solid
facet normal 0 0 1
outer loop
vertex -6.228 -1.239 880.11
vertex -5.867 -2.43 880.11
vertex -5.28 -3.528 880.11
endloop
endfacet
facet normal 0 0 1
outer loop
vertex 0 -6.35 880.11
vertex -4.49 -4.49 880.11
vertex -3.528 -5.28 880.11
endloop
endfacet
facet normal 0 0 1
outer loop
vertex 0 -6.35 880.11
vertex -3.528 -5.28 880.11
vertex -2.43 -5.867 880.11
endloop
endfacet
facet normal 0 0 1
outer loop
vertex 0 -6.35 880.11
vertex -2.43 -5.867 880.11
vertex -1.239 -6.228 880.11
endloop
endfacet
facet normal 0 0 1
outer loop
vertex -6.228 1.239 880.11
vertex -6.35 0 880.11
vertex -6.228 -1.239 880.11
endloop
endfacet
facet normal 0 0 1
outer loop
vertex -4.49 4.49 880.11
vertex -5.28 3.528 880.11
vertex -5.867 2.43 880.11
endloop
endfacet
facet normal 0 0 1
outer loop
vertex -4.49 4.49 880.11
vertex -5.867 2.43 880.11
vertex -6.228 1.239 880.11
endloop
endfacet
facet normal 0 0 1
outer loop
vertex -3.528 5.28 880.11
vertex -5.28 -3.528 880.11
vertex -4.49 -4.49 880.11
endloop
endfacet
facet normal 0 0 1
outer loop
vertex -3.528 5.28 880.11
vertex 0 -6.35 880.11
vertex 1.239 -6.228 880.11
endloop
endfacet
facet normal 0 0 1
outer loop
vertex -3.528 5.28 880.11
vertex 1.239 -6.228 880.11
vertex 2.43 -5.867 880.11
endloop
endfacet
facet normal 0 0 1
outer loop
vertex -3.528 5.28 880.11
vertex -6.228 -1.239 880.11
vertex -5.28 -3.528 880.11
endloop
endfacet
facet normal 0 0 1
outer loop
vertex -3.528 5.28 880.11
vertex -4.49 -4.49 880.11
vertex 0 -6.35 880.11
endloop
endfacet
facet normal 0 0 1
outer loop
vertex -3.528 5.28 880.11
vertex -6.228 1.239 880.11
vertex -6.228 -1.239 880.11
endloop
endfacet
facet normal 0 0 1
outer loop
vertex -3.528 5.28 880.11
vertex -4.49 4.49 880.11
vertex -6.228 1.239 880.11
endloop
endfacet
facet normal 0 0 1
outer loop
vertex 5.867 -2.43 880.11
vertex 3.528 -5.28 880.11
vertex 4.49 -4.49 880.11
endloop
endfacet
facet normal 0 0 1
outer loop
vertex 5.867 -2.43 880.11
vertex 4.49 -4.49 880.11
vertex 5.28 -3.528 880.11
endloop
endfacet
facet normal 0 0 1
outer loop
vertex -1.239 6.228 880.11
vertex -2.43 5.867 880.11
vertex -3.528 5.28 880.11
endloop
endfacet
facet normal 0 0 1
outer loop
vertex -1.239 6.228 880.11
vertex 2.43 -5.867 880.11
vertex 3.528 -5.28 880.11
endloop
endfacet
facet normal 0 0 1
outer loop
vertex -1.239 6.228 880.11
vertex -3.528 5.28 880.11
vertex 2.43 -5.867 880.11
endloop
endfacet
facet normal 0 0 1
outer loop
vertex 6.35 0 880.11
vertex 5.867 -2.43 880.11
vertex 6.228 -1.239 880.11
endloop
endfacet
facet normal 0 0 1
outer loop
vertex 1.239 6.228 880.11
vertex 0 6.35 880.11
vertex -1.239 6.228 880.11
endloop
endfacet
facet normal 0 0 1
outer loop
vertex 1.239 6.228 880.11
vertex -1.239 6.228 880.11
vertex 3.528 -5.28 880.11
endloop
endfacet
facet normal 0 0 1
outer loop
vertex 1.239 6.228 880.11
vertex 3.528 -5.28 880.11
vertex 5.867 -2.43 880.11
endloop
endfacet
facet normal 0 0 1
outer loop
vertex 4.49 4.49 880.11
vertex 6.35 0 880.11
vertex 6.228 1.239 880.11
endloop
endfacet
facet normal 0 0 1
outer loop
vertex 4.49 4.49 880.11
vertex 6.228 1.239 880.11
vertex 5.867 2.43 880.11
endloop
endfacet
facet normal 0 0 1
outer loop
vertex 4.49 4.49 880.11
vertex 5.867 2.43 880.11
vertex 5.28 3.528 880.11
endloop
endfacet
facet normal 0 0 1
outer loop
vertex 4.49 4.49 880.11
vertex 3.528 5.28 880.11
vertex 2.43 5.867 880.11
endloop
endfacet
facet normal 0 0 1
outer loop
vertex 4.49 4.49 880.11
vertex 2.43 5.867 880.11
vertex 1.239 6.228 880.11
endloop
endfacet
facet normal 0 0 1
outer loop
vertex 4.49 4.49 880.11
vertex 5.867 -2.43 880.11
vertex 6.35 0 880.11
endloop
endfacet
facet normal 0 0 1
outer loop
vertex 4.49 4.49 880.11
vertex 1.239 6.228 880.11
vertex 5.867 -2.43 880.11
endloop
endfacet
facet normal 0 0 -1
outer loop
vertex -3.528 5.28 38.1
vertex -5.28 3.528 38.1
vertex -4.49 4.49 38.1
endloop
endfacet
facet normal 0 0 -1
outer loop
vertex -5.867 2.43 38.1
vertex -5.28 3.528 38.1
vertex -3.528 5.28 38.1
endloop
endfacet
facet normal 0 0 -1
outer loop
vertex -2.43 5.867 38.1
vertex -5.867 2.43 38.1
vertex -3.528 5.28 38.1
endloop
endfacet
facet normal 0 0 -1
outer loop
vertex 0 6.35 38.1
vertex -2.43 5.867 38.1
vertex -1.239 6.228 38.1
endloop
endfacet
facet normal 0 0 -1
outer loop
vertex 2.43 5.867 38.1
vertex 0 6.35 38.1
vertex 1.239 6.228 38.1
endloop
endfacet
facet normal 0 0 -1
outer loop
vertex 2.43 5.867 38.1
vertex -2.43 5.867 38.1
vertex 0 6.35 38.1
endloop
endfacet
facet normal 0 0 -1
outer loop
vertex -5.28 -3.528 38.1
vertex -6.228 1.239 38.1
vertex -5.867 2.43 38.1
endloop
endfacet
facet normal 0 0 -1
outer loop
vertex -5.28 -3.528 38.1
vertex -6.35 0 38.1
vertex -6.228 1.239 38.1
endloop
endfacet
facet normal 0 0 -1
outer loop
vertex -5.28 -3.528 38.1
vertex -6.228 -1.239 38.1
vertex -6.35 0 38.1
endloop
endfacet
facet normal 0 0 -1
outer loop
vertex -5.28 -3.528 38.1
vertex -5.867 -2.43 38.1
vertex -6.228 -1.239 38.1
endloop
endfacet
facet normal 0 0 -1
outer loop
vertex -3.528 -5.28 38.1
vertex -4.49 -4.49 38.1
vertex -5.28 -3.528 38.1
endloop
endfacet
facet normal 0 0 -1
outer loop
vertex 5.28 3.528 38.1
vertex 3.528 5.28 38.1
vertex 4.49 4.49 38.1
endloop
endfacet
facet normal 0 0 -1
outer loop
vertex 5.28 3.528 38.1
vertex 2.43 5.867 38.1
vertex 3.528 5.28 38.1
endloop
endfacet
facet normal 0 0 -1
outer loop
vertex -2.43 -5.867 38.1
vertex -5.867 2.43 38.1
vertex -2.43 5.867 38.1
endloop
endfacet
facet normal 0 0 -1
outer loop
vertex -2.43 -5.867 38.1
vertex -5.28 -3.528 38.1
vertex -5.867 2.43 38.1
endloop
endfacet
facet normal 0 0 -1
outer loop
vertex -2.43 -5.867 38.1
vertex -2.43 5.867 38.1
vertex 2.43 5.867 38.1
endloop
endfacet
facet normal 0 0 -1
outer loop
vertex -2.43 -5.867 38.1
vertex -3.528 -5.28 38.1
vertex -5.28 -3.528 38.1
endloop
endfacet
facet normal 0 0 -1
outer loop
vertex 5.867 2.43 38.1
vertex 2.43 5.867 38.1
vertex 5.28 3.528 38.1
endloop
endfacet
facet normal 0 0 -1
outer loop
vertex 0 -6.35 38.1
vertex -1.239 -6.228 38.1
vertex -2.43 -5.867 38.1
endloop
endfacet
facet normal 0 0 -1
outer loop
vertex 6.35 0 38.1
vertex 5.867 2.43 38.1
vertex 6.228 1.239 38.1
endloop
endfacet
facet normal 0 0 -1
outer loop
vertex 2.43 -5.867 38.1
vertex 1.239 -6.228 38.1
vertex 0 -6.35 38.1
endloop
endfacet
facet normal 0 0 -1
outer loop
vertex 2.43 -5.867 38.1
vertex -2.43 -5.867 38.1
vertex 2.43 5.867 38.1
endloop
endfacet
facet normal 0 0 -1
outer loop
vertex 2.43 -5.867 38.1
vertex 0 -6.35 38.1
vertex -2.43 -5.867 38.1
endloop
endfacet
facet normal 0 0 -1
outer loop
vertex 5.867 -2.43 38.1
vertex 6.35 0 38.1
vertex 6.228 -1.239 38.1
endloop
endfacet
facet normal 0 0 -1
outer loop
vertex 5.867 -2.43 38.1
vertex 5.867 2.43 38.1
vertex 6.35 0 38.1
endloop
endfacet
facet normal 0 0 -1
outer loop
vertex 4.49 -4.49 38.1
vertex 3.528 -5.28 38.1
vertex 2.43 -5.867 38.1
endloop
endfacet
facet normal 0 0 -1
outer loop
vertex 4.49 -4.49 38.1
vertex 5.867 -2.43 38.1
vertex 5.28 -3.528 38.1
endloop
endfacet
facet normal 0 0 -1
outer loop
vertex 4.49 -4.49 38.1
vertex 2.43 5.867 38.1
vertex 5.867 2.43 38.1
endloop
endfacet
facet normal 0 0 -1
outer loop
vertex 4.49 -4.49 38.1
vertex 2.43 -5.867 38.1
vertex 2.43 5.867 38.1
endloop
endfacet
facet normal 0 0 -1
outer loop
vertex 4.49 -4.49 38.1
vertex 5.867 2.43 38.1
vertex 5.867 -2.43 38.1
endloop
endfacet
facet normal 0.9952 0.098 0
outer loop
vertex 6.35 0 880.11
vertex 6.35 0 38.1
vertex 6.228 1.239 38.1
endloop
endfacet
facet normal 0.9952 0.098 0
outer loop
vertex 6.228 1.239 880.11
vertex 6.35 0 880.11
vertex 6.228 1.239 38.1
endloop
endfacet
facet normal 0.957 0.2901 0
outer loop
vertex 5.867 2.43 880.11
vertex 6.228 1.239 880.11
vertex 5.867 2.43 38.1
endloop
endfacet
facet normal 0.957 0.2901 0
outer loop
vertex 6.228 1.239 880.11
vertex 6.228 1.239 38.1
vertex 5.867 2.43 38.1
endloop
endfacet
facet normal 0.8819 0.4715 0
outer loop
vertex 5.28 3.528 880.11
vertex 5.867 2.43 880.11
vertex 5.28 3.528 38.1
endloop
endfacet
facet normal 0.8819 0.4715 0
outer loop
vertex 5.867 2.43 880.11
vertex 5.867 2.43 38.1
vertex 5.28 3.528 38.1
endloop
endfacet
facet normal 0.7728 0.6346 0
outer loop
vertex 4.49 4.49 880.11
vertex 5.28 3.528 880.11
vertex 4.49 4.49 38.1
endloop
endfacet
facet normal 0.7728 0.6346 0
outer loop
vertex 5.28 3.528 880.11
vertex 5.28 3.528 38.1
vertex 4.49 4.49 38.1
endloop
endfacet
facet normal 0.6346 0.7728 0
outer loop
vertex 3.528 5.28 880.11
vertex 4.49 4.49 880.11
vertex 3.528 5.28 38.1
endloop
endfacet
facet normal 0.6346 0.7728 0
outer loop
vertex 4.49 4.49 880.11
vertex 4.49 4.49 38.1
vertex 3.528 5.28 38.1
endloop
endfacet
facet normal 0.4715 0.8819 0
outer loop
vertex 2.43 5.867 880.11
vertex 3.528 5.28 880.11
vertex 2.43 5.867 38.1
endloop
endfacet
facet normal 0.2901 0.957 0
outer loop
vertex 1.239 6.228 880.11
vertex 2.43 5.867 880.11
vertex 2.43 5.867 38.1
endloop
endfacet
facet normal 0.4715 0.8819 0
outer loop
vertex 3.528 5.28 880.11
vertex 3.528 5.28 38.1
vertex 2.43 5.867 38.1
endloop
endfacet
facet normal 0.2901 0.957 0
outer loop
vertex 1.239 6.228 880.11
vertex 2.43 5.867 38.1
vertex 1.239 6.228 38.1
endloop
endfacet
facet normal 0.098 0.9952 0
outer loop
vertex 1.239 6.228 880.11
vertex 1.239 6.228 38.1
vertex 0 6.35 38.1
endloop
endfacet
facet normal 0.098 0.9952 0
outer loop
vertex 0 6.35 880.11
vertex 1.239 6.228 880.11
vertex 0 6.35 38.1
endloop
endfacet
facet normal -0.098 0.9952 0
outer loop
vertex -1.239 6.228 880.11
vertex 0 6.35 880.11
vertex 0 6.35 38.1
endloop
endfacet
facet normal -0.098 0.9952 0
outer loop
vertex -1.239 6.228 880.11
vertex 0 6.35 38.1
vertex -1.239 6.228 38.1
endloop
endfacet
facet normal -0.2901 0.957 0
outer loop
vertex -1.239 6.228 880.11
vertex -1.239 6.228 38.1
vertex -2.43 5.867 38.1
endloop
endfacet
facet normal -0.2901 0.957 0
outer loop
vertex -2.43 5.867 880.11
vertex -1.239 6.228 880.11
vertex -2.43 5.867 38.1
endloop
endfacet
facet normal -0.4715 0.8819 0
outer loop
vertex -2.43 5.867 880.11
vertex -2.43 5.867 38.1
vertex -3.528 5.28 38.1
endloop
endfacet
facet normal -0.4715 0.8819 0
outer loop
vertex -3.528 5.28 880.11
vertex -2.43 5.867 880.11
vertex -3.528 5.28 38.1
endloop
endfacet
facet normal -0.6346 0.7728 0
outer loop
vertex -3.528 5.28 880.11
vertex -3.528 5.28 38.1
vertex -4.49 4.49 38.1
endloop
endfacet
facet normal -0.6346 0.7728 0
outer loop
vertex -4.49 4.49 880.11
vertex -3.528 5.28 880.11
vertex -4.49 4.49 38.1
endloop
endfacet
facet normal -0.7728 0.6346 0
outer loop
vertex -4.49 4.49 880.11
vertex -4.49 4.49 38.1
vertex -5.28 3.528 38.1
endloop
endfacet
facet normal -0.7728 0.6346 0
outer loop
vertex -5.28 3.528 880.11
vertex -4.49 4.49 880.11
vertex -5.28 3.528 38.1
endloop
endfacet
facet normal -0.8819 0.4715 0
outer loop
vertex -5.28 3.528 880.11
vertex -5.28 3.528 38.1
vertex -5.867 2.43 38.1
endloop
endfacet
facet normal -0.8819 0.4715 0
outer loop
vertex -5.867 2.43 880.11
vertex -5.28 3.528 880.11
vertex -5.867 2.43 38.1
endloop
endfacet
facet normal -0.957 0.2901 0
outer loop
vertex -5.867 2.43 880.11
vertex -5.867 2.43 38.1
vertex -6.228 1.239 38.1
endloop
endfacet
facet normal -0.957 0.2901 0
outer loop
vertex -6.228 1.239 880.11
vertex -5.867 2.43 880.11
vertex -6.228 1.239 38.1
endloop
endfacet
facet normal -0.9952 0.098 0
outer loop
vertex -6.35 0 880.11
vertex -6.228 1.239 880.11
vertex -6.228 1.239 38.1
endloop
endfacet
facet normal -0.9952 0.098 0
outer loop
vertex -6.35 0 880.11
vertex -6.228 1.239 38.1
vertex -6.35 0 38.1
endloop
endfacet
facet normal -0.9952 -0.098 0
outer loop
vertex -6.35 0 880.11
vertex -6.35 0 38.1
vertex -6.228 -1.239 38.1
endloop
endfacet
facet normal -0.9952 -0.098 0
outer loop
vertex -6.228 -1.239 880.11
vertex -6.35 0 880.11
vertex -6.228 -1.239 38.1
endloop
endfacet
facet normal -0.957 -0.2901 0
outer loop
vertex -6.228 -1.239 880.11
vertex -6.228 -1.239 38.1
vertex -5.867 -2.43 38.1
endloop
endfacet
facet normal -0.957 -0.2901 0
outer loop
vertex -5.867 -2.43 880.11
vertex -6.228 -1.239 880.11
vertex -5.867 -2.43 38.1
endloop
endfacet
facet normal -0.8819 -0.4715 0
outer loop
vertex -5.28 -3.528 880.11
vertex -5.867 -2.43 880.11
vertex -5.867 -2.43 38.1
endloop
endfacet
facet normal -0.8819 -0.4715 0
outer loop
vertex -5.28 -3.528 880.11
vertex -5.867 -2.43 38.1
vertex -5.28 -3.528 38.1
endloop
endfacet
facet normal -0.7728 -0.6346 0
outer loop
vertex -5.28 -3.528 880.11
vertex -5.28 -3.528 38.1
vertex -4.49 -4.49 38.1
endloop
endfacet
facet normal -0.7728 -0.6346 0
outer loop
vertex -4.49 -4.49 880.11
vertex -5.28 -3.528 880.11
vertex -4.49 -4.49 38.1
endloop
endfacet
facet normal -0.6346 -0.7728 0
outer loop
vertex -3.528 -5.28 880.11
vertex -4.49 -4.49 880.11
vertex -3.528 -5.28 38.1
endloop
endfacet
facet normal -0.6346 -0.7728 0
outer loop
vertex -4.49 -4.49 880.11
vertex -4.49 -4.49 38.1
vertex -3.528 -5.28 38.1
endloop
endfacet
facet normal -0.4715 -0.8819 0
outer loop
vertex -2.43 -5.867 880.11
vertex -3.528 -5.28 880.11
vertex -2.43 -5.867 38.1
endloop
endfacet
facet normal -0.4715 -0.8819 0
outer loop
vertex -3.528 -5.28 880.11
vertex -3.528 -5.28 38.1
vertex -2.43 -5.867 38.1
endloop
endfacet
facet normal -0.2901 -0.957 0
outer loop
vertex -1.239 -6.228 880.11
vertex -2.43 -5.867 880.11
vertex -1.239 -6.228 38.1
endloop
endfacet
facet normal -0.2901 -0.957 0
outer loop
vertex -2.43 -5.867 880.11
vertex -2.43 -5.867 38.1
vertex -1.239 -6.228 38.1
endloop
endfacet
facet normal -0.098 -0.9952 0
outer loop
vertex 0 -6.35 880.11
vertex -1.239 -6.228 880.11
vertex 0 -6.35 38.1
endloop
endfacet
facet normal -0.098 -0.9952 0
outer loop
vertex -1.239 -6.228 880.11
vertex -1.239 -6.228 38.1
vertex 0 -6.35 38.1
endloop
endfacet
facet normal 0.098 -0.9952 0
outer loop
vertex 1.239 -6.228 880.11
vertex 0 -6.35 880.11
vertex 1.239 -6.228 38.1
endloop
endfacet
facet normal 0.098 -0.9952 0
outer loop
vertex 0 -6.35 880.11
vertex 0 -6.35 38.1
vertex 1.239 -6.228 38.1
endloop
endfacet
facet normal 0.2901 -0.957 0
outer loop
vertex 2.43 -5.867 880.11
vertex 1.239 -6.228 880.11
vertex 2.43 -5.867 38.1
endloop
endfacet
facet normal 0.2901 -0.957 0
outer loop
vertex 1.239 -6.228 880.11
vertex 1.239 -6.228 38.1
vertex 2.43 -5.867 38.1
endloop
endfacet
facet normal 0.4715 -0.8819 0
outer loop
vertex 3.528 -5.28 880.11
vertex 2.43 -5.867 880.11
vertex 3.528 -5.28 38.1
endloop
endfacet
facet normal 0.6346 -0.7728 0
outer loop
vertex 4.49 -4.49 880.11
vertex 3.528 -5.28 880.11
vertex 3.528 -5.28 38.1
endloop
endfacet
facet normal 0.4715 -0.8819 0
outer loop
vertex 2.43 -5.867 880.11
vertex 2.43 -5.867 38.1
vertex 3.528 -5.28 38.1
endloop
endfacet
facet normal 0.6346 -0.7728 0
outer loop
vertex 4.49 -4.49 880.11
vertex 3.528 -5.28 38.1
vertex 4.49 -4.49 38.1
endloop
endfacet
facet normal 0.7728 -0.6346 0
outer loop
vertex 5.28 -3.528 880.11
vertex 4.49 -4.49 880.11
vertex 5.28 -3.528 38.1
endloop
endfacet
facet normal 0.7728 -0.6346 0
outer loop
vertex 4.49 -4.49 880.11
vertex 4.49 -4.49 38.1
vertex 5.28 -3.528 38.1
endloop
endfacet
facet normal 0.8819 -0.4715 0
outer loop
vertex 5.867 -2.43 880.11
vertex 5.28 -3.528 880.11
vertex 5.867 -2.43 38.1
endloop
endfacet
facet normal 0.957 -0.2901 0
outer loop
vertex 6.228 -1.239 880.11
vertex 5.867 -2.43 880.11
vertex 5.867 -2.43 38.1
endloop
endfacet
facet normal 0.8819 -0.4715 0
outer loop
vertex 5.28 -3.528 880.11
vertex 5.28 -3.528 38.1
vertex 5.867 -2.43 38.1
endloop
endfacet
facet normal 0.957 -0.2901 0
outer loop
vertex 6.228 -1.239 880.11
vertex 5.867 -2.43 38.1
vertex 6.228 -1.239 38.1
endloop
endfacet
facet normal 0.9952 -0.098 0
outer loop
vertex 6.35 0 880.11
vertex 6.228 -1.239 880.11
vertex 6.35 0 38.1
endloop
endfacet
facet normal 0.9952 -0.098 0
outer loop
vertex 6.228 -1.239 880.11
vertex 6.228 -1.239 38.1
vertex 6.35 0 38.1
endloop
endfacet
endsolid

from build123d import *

# Parameters (mm, degrees)
SKETCH1_R                    = 6.35
BOSS_EXTRUDE1_DEPTH          = 914.4
ENL_V_START                  = -34.29
ESQUISSE1_R                  = 6.35
ENL_V_MAT_EXTRU_1_DEPTH      = 34.29
ENL_V_MAT_EXTRU_3_DEPTH      = 881.155814103
ENL_V_MAT_EXTRU_3_DEPTH_BACK = 881.155814103
ESQUISSE3_W                  = 12.7
ESQUISSE3_H                  = 38.1


with BuildPart() as part:
    # Sketch1 → Boss-Extrude1 (new body)
    with BuildSketch(Plane.XY):
        Circle(SKETCH1_R)
    extrude(amount=BOSS_EXTRUDE1_DEPTH)

    # Esquisse1 → Enlèv. mat.-Extru.1 (cut)
    with BuildSketch(Plane.XY.offset(914.4).offset(ENL_V_START)):
        Circle(ESQUISSE1_R)
    extrude(amount=ENL_V_MAT_EXTRU_1_DEPTH, mode=Mode.SUBTRACT)

    # Esquisse3 → Enlèv. mat.-Extru.3 (cut, two sides: drawn at the far end of the back side and taken through both)
    with BuildSketch(Plane(origin=(0, 0, 0), x_dir=(1, 0, 0), z_dir=(0, 1, 0)).offset(-ENL_V_MAT_EXTRU_3_DEPTH_BACK)):
        with Locations((0, -19.05)):
            Rectangle(ESQUISSE3_W, ESQUISSE3_H)
    extrude(amount=ENL_V_MAT_EXTRU_3_DEPTH + ENL_V_MAT_EXTRU_3_DEPTH_BACK, mode=Mode.SUBTRACT)


solid = part.part
